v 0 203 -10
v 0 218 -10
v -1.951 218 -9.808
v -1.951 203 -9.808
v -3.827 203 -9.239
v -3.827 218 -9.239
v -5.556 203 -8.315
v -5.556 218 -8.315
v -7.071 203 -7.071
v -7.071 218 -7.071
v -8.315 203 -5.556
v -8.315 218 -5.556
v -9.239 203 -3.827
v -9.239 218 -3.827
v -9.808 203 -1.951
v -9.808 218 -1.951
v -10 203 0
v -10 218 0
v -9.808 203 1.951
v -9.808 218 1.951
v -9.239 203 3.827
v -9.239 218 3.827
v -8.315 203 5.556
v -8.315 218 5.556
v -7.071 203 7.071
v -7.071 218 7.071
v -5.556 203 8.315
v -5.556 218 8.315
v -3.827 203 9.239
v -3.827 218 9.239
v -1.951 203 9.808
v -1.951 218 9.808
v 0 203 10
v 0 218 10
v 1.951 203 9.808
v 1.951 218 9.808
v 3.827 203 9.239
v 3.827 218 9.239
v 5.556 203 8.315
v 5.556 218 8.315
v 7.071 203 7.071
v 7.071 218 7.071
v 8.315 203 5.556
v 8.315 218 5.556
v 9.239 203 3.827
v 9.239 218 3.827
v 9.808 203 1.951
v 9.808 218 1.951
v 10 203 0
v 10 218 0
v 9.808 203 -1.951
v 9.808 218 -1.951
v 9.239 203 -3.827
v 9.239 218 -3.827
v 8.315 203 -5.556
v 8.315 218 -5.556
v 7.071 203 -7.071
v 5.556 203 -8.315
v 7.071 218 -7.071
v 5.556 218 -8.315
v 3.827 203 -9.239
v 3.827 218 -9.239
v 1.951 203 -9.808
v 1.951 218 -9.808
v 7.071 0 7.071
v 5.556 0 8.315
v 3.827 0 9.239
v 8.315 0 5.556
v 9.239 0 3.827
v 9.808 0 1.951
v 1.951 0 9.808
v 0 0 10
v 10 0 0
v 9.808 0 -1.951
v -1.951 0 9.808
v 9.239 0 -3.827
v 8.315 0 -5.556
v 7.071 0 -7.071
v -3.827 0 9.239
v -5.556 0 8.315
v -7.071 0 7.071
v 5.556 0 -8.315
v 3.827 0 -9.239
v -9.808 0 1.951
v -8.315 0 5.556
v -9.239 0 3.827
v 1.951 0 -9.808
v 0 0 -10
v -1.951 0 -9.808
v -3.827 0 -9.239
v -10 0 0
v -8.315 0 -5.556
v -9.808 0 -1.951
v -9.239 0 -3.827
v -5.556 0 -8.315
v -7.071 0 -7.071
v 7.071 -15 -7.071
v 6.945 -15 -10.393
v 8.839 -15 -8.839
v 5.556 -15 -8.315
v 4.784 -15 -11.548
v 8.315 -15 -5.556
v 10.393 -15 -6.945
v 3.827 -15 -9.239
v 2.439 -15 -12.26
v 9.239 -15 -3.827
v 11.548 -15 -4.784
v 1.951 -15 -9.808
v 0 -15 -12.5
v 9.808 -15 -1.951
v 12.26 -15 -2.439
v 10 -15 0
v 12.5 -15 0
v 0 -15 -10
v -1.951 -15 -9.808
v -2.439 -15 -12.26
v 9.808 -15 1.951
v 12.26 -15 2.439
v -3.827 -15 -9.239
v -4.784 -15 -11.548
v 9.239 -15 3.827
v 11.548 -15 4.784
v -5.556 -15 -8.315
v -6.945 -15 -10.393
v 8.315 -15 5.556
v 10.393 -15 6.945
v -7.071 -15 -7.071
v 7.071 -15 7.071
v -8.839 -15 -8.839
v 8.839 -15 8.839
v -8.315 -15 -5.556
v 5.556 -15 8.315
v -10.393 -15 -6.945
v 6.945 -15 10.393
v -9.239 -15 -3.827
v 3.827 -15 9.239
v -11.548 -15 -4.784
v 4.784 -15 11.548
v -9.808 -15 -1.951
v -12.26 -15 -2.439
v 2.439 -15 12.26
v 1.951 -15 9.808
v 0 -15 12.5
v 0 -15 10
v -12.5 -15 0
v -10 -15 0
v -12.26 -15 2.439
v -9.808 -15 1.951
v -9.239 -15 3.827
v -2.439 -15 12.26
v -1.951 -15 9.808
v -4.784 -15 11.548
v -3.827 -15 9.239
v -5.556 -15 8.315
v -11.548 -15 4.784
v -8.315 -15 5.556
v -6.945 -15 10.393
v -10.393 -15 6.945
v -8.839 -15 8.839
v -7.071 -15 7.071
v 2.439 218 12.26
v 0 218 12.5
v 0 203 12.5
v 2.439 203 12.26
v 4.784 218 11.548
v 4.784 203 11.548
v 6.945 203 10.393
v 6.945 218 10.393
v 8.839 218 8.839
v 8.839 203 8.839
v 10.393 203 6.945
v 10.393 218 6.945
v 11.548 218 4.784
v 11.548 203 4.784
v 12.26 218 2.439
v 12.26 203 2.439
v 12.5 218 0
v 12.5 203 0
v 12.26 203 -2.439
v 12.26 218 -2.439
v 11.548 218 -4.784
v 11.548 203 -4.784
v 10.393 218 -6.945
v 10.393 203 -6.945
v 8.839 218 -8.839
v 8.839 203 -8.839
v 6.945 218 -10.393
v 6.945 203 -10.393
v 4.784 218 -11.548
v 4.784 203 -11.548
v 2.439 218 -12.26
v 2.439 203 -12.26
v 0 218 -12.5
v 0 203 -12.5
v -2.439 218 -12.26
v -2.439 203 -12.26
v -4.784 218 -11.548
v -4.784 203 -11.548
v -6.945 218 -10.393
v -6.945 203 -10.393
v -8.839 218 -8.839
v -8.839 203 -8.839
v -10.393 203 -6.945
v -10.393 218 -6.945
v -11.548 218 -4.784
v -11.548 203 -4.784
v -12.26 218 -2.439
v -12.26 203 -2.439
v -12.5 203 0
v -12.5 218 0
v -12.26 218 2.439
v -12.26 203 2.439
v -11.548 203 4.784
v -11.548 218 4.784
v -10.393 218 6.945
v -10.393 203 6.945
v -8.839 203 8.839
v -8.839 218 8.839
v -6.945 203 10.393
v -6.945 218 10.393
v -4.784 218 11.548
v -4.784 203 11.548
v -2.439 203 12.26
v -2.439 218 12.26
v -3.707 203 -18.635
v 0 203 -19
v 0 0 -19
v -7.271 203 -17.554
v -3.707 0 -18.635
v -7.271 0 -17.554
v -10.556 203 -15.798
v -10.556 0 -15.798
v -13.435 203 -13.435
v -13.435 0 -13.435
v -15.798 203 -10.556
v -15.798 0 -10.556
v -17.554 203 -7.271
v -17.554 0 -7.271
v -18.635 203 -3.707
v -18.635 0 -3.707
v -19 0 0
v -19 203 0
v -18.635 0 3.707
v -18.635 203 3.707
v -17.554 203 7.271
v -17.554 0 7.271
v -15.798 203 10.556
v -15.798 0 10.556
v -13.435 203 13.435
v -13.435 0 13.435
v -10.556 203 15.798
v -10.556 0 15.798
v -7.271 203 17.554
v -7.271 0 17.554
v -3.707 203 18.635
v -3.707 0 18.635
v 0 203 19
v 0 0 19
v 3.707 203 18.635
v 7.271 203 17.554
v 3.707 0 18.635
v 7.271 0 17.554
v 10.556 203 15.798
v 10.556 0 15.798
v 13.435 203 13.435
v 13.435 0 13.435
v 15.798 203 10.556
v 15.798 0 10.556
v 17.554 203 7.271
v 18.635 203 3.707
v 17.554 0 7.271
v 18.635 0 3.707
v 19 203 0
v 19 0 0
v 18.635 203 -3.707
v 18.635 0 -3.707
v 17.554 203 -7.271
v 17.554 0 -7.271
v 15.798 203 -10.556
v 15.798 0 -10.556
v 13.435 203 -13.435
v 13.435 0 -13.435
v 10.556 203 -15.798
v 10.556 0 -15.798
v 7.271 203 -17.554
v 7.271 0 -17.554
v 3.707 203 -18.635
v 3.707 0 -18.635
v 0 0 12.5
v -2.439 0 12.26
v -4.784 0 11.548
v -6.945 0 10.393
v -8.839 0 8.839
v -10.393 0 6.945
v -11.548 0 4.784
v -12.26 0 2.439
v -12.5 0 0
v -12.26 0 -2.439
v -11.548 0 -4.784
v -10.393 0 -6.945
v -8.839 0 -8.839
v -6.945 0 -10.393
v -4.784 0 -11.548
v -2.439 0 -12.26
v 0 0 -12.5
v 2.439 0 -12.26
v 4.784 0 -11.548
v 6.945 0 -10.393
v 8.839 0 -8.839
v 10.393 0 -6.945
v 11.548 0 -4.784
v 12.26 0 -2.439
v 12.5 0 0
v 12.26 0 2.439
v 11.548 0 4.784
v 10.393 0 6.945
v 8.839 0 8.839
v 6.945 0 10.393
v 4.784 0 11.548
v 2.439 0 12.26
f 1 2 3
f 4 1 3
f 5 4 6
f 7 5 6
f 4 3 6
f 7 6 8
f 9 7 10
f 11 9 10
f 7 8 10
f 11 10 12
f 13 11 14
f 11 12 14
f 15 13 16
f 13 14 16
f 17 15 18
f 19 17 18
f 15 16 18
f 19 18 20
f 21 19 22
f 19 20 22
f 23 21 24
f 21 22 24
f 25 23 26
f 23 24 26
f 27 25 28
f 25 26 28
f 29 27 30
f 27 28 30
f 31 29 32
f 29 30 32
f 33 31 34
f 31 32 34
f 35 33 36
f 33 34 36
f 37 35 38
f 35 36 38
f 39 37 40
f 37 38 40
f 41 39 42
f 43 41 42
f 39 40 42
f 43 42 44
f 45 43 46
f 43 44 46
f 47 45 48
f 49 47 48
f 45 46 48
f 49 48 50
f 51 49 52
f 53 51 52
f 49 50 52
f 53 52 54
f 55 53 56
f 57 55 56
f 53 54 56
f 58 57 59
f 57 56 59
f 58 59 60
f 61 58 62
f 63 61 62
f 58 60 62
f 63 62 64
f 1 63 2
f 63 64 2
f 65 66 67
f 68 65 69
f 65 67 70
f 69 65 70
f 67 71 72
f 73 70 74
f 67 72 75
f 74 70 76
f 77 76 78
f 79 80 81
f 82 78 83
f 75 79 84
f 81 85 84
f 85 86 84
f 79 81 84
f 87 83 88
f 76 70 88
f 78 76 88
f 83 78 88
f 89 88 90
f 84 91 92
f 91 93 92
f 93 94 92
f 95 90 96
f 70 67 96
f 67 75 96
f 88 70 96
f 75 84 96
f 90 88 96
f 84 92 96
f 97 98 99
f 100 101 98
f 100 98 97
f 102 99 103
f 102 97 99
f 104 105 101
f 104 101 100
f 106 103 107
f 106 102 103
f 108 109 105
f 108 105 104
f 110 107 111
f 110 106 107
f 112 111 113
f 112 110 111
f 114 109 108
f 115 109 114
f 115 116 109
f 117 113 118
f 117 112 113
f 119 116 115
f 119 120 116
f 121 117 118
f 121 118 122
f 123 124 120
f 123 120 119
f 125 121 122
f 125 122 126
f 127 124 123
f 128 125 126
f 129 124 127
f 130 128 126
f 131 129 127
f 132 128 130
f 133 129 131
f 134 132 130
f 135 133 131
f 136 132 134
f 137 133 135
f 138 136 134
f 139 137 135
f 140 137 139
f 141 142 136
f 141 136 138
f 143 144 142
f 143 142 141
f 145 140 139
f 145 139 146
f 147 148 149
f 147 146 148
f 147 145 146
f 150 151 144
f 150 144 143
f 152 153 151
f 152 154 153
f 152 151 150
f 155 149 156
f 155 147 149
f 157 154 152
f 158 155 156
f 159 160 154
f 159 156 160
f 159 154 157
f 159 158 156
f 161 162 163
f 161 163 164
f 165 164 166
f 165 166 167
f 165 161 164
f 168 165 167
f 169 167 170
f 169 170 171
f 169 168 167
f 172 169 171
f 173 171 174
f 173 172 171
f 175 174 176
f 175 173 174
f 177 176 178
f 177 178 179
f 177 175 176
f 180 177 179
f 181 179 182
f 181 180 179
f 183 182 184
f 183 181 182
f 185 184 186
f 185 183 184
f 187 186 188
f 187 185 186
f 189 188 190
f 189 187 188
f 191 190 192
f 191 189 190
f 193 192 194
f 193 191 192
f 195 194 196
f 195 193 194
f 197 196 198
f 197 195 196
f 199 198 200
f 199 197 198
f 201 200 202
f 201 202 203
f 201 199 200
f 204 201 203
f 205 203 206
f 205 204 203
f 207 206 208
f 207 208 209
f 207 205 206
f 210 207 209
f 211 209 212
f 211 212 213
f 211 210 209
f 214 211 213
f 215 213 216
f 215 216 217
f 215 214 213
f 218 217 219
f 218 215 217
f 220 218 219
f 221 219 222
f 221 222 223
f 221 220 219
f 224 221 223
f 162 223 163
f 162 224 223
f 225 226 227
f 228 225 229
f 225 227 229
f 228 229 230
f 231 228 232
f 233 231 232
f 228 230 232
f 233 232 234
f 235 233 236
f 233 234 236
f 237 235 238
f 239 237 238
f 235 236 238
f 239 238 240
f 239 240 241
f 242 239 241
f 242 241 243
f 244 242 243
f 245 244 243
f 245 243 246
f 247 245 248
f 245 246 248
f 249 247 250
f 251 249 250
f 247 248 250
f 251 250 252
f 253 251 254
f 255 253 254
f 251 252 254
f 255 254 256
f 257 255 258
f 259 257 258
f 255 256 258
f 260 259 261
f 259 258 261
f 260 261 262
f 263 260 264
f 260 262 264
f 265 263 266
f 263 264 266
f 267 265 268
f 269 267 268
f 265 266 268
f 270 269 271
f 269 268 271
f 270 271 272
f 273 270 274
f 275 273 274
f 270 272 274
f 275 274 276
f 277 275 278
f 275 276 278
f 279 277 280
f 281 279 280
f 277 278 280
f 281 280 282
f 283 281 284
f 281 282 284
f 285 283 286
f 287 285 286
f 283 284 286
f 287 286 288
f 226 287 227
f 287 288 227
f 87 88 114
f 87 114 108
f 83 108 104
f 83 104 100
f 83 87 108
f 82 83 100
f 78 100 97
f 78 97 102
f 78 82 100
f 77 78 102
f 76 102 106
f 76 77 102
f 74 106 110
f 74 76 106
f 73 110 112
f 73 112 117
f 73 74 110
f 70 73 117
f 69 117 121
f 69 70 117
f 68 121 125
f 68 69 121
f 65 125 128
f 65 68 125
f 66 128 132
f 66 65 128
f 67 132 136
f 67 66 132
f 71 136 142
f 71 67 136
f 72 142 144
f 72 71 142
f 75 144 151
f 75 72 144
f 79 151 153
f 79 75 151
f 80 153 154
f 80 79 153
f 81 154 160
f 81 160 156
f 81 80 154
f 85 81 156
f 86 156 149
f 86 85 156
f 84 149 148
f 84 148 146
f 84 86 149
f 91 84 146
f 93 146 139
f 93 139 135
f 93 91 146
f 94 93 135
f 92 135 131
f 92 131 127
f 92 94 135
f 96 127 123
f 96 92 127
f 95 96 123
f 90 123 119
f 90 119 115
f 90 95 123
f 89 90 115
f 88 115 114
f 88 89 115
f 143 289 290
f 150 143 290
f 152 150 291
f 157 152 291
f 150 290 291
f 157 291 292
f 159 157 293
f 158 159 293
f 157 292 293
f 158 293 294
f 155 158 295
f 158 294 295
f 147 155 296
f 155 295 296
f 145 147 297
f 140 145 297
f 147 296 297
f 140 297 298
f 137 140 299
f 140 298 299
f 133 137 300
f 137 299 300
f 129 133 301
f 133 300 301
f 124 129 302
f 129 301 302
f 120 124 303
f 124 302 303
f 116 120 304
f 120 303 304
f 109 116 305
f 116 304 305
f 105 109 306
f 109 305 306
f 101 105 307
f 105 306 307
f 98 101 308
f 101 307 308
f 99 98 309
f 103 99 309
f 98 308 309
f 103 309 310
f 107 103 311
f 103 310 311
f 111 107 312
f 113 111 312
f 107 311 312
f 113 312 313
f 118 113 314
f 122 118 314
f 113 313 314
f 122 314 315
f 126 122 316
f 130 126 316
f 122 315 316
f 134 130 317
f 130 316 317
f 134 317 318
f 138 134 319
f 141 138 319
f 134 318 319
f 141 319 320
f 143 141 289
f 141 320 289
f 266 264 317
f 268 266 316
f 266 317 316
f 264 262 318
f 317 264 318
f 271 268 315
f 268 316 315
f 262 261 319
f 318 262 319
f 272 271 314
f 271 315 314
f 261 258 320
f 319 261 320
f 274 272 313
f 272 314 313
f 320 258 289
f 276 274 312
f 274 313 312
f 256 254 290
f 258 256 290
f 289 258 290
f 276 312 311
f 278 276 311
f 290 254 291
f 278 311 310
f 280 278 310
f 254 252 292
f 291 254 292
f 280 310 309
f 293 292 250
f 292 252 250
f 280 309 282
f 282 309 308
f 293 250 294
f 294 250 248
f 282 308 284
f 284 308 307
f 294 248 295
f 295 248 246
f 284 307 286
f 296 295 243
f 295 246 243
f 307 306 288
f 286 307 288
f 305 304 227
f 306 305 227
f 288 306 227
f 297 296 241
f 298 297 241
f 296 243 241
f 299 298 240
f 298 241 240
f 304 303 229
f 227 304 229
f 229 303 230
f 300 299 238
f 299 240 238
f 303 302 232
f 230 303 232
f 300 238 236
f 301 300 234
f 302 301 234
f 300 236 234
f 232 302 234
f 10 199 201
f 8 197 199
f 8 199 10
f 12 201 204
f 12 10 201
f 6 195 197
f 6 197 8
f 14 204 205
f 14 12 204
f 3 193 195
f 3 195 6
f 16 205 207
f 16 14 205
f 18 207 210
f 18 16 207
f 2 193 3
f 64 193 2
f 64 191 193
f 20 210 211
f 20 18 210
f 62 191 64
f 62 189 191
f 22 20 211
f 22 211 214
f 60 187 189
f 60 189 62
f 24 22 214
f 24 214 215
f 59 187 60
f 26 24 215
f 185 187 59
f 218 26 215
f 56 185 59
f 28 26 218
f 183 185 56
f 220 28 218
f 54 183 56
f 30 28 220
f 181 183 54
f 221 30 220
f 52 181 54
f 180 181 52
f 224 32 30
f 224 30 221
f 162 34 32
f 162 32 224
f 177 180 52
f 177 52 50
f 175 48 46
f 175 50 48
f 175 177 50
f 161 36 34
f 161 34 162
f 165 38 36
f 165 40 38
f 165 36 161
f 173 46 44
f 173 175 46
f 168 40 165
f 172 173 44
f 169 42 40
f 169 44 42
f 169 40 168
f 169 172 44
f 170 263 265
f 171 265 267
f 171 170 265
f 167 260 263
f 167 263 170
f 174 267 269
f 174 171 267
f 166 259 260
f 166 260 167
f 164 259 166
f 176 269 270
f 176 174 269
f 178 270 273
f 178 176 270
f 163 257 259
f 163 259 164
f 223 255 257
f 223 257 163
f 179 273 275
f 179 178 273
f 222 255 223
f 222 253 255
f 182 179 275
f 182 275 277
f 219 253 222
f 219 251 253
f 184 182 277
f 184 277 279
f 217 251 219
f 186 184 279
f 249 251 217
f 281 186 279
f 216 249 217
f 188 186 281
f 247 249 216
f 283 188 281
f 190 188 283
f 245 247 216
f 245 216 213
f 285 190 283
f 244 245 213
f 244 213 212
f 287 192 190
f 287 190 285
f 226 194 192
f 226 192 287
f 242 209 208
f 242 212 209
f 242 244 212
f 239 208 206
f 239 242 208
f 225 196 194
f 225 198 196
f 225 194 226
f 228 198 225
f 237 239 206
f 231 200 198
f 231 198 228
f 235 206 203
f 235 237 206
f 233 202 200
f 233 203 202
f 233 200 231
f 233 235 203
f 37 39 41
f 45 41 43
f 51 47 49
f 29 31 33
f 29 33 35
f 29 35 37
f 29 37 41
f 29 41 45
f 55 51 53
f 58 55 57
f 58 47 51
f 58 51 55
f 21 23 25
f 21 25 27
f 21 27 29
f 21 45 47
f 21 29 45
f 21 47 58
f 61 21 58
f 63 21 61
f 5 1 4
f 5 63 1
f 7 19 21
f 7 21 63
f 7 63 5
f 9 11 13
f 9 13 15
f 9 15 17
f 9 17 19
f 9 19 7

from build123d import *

# Parameters (mm, degrees)
SKETCH1_R           = 19
BOSS_EXTRUDE1_DEPTH = 203
SKETCH2_R           = 12.5
SKETCH2_R_2         = 10
BOSS_EXTRUDE2_DEPTH = 15
BOSS_EXTRUDE3_START = 15
SKETCH3_R           = 12.5
SKETCH3_R_2         = 10
BOSS_EXTRUDE3_DEPTH = 15


with BuildPart() as part:
    # Sketch1 → Boss-Extrude1 (new body)
    with BuildSketch(Plane(origin=(0, 0, 0), x_dir=(1, 0, 0), z_dir=(0, 1, 0))):
        with Locations(Location((0, 0, 0), (0, 0, 90))):
            Circle(SKETCH1_R)
    extrude(amount=BOSS_EXTRUDE1_DEPTH)

    # Sketch2 → Boss-Extrude2 (add)
    with BuildSketch(Plane.XZ):
        with Locations(Location((0, 0, 0), (0, 0, 90))):
            Circle(SKETCH2_R)
        with Locations(Location((0, 0, 0), (0, 0, 270))):
            Circle(SKETCH2_R_2, mode=Mode.SUBTRACT)
    extrude(amount=BOSS_EXTRUDE2_DEPTH)

    # Sketch3 → Boss-Extrude3 (add)
    with BuildSketch(Plane(origin=(0, 203, 0), x_dir=(1, 0, 0), z_dir=(0, 1, 0)).offset(BOSS_EXTRUDE3_START)):
        with Locations(Location((0, 0, 0), (0, 0, 270))):
            Circle(SKETCH3_R)
        with Locations(Location((0, 0, 0), (0, 0, 90))):
            Circle(SKETCH3_R_2, mode=Mode.SUBTRACT)
    extrude(amount=-BOSS_EXTRUDE3_DEPTH)


solid = part.part
